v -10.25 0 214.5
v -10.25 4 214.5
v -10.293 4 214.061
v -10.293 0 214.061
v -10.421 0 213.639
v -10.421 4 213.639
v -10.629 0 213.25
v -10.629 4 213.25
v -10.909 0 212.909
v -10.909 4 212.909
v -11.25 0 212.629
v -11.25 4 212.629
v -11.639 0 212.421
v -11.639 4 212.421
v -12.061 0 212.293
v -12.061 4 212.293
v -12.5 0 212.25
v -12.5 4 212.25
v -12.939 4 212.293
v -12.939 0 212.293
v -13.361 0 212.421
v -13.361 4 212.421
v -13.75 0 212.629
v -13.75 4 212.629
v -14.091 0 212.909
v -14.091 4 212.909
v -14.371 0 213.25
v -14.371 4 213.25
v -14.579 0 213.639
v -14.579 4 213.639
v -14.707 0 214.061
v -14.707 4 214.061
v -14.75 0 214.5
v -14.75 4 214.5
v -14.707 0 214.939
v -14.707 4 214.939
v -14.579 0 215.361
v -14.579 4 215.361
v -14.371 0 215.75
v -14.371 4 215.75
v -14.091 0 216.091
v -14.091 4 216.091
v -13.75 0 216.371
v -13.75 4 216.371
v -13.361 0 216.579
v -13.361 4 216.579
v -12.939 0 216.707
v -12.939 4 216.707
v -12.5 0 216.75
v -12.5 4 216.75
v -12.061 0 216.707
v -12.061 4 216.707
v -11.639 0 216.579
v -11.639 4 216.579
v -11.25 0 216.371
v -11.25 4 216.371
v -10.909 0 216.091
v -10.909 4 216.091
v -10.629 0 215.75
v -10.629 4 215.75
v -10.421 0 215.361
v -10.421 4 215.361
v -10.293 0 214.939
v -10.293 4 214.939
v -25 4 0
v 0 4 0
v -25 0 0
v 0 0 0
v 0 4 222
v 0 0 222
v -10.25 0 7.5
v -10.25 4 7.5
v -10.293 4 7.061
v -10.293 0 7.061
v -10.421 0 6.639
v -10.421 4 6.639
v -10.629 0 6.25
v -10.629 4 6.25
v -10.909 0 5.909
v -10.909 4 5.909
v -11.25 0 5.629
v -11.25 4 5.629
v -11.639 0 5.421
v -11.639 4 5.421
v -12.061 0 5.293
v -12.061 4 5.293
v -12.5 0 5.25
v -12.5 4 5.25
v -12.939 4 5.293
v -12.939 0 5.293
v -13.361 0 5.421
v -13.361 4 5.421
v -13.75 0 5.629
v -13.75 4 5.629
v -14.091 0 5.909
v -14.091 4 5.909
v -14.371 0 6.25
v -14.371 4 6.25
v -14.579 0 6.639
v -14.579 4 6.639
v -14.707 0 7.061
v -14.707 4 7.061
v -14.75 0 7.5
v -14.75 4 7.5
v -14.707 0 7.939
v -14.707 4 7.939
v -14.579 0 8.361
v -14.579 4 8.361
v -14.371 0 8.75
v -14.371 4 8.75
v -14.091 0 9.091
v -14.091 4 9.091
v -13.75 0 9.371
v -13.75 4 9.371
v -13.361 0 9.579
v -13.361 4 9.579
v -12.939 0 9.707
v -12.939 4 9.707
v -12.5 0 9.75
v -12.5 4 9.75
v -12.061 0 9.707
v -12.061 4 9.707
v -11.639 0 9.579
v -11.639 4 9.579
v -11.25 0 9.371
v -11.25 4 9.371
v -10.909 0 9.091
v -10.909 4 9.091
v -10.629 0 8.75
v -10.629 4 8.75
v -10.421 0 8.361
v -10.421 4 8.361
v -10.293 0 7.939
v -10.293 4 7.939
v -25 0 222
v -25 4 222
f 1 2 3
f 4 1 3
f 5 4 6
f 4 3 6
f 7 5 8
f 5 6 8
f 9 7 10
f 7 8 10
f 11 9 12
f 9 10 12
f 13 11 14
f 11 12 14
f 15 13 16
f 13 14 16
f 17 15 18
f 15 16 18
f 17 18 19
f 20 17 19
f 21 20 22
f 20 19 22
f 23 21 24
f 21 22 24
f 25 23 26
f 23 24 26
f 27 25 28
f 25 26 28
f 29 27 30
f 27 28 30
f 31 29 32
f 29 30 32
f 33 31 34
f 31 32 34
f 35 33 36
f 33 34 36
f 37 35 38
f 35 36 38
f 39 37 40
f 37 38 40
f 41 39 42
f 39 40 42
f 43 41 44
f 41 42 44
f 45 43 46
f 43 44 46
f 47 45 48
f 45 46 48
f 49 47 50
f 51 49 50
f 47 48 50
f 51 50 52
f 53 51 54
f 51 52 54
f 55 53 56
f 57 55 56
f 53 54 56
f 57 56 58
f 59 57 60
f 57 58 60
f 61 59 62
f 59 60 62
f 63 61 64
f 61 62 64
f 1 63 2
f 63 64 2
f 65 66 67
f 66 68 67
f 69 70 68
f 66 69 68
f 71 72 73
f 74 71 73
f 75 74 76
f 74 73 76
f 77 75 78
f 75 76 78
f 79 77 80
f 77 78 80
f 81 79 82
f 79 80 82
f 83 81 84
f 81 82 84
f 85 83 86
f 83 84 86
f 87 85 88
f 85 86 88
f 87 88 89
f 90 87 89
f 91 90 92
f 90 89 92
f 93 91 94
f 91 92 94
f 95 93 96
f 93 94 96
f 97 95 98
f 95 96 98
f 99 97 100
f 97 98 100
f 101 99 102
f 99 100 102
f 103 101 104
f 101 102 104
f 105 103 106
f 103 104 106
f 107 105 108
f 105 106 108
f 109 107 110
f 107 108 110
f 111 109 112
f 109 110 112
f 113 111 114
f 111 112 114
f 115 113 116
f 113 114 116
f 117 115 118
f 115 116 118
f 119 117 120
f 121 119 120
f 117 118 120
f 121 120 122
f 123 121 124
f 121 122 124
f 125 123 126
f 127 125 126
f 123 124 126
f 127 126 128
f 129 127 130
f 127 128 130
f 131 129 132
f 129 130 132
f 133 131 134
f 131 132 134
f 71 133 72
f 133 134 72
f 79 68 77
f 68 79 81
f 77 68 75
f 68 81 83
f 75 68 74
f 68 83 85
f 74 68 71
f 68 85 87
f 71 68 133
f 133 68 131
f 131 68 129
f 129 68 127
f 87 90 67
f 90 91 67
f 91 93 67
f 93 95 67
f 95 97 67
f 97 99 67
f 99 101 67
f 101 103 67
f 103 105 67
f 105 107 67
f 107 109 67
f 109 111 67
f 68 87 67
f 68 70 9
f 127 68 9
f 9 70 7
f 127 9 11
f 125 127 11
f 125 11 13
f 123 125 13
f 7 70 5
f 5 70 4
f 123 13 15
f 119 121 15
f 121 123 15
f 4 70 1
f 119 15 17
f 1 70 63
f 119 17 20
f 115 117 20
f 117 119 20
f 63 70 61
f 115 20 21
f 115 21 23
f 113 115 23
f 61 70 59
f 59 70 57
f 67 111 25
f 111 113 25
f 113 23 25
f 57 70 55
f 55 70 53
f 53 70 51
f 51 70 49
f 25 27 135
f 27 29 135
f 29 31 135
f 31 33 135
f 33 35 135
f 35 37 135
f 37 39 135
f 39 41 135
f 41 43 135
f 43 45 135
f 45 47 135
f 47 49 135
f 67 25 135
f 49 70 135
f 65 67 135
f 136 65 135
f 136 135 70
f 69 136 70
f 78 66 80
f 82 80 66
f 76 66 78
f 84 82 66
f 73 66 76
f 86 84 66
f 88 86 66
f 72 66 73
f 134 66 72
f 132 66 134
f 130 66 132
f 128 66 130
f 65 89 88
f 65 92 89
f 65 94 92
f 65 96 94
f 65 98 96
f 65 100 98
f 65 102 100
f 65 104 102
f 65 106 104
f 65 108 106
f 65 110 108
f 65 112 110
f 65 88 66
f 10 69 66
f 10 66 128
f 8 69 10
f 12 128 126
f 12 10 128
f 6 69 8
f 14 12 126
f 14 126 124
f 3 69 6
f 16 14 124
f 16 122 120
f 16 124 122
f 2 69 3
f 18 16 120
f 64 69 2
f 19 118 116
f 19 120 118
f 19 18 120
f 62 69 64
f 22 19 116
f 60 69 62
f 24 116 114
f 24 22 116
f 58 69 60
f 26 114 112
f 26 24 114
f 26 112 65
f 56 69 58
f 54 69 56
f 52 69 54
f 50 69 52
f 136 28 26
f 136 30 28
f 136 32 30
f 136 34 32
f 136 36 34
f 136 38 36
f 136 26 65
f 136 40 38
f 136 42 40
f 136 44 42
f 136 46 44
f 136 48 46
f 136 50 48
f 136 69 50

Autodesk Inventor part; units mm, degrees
ref_plane "YZ Plane" through (0, 0, 0) normal (1, 0, 0) x (0, 1, 0)
ref_plane "XZ Plane" through (0, 0, 0) normal (0, 1, 0) x (-1, 0, 0)
ref_plane "XY Plane" through (0, 0, 0) normal (0, 0, 1) x (1, 0, 0)
sketch "Эскиз1" plane through (0, 0, 0) normal (0, 1, 0) x (-1, 0, 0)
  line L0 (0, 0) -> (25, 0)
  line L1 (25, 0) -> (25, 222)
  line L2 (25, 222) -> (0, 222)
  line L3 (0, 222) -> (0, 0)
  dimension "d0" = 25
  dimension "d1" = 222
extrude "Выдавливание1" add sketch "Эскиз1" along normal blind 4
sketch "Эскиз2" plane through (0, 4, 0) normal (0, 1, 0) x (1, 0, 0)
  circle A0 centre (-12.5, -7.5) radius 2.25
  line L0 (0, 0) -> (-25, 0) projected
  line L1 (0, -222) -> (0, 0) projected
  line L2 (0, -111) -> (-46.0375, -111)
  circle A1 centre (-12.5, -214.5) radius 2.25
  dimension "d4" = 4.5
  dimension "d5" = 7.5
extrude "Выдавливание2" cut sketch "Эскиз2" against normal blind 4
properties part number "жгут низ"
